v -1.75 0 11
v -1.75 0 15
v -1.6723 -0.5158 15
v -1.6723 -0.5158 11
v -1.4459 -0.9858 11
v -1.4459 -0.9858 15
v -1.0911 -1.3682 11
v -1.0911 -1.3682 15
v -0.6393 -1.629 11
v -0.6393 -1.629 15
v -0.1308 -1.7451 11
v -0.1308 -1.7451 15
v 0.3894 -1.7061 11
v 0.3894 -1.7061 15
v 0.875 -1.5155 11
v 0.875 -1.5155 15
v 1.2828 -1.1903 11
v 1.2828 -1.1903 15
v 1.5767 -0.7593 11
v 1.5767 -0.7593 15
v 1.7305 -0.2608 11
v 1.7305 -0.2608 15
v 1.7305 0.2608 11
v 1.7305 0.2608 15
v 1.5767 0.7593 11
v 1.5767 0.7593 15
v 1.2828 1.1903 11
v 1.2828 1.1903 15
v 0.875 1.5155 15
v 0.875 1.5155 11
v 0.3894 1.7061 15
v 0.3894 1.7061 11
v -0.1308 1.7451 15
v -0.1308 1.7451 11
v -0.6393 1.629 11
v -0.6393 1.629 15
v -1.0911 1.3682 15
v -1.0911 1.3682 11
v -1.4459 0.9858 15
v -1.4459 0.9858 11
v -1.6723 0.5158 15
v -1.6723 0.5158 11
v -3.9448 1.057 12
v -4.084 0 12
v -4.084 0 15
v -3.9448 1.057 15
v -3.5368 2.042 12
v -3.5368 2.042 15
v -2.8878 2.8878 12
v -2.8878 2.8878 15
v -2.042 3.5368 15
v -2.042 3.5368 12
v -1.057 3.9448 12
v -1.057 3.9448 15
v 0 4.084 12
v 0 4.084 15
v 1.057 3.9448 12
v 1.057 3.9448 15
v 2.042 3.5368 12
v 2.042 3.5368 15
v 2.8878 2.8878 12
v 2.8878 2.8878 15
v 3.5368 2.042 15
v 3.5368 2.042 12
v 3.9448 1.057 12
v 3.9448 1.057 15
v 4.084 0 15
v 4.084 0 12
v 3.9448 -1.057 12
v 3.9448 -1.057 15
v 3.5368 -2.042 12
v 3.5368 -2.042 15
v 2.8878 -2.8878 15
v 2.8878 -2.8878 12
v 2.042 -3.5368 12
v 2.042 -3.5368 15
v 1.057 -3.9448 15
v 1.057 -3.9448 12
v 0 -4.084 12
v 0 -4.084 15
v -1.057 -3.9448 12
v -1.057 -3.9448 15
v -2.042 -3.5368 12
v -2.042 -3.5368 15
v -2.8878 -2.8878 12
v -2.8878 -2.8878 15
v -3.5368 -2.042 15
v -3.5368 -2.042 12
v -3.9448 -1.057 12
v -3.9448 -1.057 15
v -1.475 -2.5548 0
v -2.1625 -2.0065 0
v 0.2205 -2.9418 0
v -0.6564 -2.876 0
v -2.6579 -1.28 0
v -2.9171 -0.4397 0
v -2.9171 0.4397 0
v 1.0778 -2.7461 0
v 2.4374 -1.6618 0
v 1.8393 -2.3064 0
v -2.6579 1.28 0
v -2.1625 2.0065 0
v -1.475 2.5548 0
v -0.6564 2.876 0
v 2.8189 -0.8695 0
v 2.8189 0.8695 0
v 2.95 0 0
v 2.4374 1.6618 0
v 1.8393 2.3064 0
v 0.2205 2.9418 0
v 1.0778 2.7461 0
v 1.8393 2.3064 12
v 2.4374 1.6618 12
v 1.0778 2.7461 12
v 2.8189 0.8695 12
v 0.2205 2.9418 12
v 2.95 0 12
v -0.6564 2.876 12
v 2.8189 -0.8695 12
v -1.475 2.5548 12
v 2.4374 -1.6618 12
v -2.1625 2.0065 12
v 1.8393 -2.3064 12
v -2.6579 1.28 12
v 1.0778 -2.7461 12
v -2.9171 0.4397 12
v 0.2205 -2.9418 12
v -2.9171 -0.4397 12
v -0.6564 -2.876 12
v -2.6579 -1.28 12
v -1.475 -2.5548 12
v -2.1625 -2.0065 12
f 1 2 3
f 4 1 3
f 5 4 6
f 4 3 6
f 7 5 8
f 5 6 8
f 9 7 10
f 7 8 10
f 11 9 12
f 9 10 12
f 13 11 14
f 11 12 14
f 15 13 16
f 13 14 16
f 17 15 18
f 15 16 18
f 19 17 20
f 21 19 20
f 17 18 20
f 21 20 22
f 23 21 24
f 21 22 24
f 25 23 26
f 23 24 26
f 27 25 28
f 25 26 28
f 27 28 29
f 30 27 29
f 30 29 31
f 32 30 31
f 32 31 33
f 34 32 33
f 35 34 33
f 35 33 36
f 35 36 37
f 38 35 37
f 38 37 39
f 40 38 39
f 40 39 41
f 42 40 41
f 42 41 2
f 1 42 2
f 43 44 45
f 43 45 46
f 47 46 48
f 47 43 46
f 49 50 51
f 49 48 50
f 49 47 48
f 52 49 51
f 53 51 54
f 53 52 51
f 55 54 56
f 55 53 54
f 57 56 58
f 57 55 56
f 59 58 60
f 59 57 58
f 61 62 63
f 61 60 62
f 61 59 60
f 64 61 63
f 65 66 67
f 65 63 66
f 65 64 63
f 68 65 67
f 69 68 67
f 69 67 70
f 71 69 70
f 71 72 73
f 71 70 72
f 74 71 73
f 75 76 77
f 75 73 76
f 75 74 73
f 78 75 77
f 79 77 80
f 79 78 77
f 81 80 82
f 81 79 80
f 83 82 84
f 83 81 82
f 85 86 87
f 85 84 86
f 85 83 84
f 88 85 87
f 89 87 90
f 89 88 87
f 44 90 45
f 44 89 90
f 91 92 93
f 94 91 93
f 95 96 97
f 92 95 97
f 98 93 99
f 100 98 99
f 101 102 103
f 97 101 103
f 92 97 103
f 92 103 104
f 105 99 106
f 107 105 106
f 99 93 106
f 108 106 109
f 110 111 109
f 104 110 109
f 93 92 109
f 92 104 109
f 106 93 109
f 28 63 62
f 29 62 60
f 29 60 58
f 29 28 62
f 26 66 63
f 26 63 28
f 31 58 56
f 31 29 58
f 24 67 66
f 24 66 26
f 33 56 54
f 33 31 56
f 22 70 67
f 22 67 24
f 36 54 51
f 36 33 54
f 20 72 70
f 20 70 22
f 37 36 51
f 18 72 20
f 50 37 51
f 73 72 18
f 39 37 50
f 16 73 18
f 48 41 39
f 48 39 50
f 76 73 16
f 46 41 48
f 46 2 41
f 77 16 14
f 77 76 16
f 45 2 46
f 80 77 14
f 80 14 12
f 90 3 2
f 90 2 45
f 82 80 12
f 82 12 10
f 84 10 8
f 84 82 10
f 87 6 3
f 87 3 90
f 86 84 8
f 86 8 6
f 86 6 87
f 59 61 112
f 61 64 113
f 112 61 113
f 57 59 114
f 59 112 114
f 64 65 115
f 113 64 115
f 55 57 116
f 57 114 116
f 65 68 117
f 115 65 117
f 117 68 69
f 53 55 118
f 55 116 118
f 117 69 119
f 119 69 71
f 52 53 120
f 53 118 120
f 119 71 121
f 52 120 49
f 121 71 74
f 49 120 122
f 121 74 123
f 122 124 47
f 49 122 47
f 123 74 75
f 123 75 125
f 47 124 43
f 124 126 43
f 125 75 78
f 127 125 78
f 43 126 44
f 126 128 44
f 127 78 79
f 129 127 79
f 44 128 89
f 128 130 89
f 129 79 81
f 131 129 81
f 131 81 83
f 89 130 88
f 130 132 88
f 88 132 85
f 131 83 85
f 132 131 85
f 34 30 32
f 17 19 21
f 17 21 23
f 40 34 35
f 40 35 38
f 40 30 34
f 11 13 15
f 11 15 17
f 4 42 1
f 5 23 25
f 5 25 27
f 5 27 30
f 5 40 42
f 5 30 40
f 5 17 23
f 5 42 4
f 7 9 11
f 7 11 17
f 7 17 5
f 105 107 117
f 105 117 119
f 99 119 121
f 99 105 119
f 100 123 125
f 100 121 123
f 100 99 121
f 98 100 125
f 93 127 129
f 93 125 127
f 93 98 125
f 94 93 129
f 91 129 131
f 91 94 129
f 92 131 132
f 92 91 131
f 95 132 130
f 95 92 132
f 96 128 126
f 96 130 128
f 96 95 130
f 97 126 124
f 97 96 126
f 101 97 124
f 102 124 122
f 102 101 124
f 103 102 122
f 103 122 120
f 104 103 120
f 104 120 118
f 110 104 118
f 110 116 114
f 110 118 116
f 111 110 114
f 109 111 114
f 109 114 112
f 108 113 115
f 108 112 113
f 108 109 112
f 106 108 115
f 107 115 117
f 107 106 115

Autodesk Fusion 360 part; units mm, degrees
sketch "Sketch1" plane through (0, 0, 0) normal (0, 0, 1) x (1, 0, 0)
  circle A0 centre (0, 0) radius 2.95
  dimension "d1" = 5.9
extrude "Extrude1" add sketch "Sketch1" along normal blind 12
sketch "Sketch2" plane through (0, 0, 12) normal (0, 0, 1) x (-1, 0, 0)
  circle A0 centre (0, 0) radius 2.95
  circle A1 centre (0, 0) radius 4.084
extrude "Extrude2" add sketch "Sketch2" along normal blind 3 contours A0 | A1
sketch "Sketch3" plane through (0, 0, 15) normal (0, 0, 1) x (-1, 0, 0)
  circle A0 centre (0, 0) radius 4.084
  circle A1 centre (0, 0) radius 1.75
  dimension "d6" = 3.5
extrude "Extrude3" cut sketch "Sketch3" against normal blind 4 contours A1
